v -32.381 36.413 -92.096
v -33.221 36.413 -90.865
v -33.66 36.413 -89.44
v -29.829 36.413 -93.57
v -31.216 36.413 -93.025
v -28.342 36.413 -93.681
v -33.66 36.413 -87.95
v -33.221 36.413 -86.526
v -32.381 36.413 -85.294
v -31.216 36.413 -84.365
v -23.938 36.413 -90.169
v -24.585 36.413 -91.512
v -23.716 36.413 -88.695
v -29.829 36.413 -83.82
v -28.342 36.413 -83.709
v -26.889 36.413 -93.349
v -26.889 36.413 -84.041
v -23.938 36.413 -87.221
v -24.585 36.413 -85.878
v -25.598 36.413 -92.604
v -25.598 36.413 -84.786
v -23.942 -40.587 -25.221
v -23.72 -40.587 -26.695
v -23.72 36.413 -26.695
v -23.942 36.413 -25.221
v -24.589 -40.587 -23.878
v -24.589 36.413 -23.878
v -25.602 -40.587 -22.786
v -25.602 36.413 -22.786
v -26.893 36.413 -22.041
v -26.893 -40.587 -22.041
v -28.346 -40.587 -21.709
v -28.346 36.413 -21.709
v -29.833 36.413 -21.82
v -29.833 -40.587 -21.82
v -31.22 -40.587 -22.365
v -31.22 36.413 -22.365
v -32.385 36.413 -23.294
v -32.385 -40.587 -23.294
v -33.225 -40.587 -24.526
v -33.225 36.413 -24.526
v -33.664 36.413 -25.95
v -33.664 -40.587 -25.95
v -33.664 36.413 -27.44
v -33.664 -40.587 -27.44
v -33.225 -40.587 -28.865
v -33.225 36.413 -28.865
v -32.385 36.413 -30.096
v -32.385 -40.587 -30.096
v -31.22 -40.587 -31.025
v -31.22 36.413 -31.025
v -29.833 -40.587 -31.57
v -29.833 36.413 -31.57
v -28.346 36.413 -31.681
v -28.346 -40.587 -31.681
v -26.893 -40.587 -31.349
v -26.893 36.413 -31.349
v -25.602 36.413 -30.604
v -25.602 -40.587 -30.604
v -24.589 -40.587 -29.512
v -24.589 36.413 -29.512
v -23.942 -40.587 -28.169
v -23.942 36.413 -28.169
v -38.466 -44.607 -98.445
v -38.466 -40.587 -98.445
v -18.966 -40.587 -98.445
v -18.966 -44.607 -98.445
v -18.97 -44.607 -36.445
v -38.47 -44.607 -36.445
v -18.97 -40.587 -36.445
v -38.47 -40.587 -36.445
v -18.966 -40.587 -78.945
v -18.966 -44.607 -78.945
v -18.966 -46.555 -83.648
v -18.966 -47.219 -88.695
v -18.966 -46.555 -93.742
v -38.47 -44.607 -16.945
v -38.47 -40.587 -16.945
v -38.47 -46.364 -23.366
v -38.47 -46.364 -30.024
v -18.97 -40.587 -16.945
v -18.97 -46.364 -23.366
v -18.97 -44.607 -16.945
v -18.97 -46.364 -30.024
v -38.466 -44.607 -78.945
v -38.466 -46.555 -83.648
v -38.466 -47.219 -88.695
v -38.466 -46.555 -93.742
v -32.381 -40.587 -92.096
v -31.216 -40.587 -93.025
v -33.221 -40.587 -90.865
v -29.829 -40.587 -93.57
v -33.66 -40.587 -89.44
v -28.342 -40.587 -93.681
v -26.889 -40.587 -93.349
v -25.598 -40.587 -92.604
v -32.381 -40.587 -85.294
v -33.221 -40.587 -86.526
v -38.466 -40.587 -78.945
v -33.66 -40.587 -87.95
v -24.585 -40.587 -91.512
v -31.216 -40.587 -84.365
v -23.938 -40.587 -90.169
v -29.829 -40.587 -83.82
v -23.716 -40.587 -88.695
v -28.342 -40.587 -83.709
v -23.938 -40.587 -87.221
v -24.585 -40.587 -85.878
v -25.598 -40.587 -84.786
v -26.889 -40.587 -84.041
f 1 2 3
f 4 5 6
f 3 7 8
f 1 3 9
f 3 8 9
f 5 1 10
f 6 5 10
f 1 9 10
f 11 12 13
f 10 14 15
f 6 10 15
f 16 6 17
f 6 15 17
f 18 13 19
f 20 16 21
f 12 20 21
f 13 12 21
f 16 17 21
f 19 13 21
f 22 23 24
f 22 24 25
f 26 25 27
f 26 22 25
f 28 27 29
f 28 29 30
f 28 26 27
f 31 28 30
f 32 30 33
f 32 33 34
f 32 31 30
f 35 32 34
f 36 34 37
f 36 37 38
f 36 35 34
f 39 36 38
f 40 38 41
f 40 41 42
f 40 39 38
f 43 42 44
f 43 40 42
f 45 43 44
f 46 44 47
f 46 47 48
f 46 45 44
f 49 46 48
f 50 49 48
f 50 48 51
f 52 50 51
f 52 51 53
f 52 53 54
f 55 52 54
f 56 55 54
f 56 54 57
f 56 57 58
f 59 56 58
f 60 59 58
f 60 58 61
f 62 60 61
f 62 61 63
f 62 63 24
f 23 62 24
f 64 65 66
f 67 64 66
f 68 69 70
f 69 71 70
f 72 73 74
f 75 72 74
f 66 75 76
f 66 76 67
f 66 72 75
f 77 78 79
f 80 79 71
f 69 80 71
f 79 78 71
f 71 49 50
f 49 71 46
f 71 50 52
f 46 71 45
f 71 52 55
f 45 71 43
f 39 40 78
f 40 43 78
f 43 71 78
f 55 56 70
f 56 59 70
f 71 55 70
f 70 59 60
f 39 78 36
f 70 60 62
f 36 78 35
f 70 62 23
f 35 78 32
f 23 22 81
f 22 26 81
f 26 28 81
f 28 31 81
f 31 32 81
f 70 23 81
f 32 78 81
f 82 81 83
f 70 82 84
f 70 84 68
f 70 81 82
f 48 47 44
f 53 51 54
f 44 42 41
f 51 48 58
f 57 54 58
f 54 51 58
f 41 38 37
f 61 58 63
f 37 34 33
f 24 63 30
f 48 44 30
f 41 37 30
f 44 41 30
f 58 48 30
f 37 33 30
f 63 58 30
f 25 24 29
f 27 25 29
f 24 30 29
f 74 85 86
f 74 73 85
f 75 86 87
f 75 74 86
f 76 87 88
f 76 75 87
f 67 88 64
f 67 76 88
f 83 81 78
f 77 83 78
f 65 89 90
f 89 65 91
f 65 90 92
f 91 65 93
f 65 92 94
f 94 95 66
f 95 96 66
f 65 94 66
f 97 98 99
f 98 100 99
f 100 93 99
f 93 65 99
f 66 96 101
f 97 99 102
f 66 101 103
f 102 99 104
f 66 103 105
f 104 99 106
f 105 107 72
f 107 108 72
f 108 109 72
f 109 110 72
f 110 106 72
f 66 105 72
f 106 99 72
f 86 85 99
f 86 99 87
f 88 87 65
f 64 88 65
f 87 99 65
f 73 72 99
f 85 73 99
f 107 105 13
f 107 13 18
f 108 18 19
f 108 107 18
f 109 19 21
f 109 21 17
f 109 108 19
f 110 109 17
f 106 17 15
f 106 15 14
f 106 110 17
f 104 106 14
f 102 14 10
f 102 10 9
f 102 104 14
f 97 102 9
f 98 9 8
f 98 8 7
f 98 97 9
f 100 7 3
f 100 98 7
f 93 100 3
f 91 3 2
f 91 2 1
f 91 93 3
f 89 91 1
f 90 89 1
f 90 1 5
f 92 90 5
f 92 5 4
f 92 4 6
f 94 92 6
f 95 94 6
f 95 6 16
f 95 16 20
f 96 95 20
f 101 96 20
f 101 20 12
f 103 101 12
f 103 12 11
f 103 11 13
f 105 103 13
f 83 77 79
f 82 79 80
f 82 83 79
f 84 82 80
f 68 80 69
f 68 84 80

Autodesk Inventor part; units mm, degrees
ref_plane "YZ Plane" through (0, 0, 0) normal (1, 0, 0) x (0, 1, 0)
ref_plane "XZ Plane" through (0, 0, 0) normal (0, 1, 0) x (-1, 0, 0)
ref_plane "XY Plane" through (0, 0, 0) normal (0, 0, 1) x (1, 0, 0)
ref_plane "Work Plane1" through (-28.7199, -40.5866, -26.6951) normal (0, -1, 0) x (1, 0, 0)
sketch "Sketch1" plane through (-28.7199, -40.5866, -26.6951) normal (0, -1, 0) x (1, 0, 0)
  line L0 (9.75, 9.75) -> (-9.75, 9.75)
  line L1 (-9.75, 9.75) -> (-9.75, -9.75)
  line L2 (-9.75, -9.75) -> (9.75, -9.75)
  line L3 (9.75, -9.75) -> (9.75, 9.75)
  line L4 (9.75, 9.75) -> (-9.75, -9.75) construction
  line L5 (-9.75, 9.75) -> (9.75, -9.75) construction
  circle A0 centre (0, 0) radius 5
  point P0 (28.7199, 26.6951)
  dimension "d0" = 19.5
  dimension "d1" = 19.5
  dimension "d2" = 10
extrude "Extrusion1" add sketch "Sketch1" against normal blind 77 contours A0
thread "Thread1" size "M10x1.5" class "6g" standard "ANSI Metric M Profile" length 76
sketch "Sketch2" plane through (-28.7199, -40.5866, -26.6951) normal (0, -1, 0) x (1, 0, 0)
  circle A0 centre (0, 0) radius 5 projected
  line L0 (9.75, 9.75) -> (-9.75, 9.75)
  line L1 (-9.75, 9.75) -> (-9.75, -9.75)
  line L2 (-9.75, -9.75) -> (9.75, -9.75)
  line L3 (9.75, -9.75) -> (9.75, 9.75)
  line L4 (9.75, 9.75) -> (-9.75, -9.75) construction
  line L5 (-9.75, 9.75) -> (9.75, -9.75) construction
  point P0 (28.7199, 26.6951)
  dimension "d7" = 19.5
  dimension "d8" = 19.5
extrude "Extrusion2" add sketch "Sketch2" along normal blind 4.02 contours A0 | L3 L2 L1 L0
sketch "Sketch3" plane through (-18.9699, -40.5866, -16.9451) normal (1, 0, 0) x (0, 0, -1)
  line L0 (19.5, -4.02) -> (0, -4.02) projected
  arc A0 (0, -4.02) -> (19.5, -4.02) centre (9.75, 19.0004) ccw
  point P0 (-16.9451, 40.5866)
  dimension "d11" = 25
extrude "Extrusion3" add sketch "Sketch3" against normal blind 19.5
ref_plane "Work Plane2" through (-28.7159, -40.5866, -88.6951) normal (0, -1, 0) x (1, 0, 0)
sketch "Sketch4" plane through (-28.7159, -40.5866, -88.6951) normal (0, -1, 0) x (1, 0, 0)
  circle A0 centre (0, 0) radius 5 projected
  circle A1 centre (0, 0) radius 5
  line L0 (9.75, 9.75) -> (-9.75, 9.75)
  line L1 (-9.75, 9.75) -> (-9.75, -9.75)
  line L2 (-9.75, -9.75) -> (9.75, -9.75)
  line L3 (9.75, -9.75) -> (9.75, 9.75)
  line L4 (9.75, 9.75) -> (-9.75, -9.75) construction
  line L5 (-9.75, 9.75) -> (9.75, -9.75) construction
  point P0 (28.7159, 88.6951)
  dimension "d14" = 19.5
  dimension "d15" = 19.5
extrude "Extrusion4" add sketch "Sketch4" against normal blind 77 contours A0
sketch "Sketch5" plane through (-28.7159, -40.5866, -88.6951) normal (0, -1, 0) x (1, 0, 0)
  circle A0 centre (0, 0) radius 5 projected
  line L0 (9.75, 9.75) -> (-9.75, 9.75)
  line L1 (-9.75, 9.75) -> (-9.75, -9.75)
  line L2 (-9.75, -9.75) -> (9.75, -9.75)
  line L3 (9.75, -9.75) -> (9.75, 9.75)
  line L4 (9.75, 9.75) -> (-9.75, -9.75) construction
  line L5 (-9.75, 9.75) -> (9.75, -9.75) construction
  point P0 (28.7159, 88.6951)
  dimension "d18" = 19.5
  dimension "d19" = 19.5
extrude "Extrusion5" add sketch "Sketch5" along normal blind 4.02 contours A0 | L3 L2 L1 L0
sketch "Sketch6" plane through (-18.9659, -40.5866, -78.9451) normal (1, 0, 0) x (0, 0, -1)
  line L0 (19.5, -4.02) -> (0, -4.02) projected
  arc A0 (0, -4.02) -> (19.5, -4.02) centre (9.75, 12.8675) ccw
  point P0 (-78.9451, 40.5866)
  dimension "d22" = 19.5
extrude "Extrusion6" add sketch "Sketch6" against normal blind 19.5
thread "Thread2" size "M10x1.5" class "6g" standard "ANSI Metric M Profile" length 76
properties part number "SCREW" material "Steel, Mild"
